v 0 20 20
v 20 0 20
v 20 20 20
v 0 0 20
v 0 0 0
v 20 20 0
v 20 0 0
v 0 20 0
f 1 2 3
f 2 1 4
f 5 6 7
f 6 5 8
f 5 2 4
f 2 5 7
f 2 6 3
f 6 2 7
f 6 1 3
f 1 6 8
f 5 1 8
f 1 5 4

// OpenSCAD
// 01 - Introduction

// This is a comment

i = 0; // This is a variable assignment and a comment

/* 
This is a
multi-line
comment
*/

// Output a string and the value of i:
echo("The value of i is:");
echo(i);

// Hit F5 (or Design -> Compile) to run.
// If you prefer your own editor, you can Reload and Compile (F4)

// Don't forget to end your statements with a semi-colon(;)

i = 3;
// Re-running this will now output 3, as variables are set at compile time!

// Let's draw something!
// Values are mm when converted to STL
cube(size=20);
// cube(20); // Same thing with less text

// Hit F5 (or Design -> Compile) to 

// View -> Show axes to see the origin and which axis is which
// Middle mouse button to zoom in and out
// Left mouse button to rotate
// Right mouse button to move
